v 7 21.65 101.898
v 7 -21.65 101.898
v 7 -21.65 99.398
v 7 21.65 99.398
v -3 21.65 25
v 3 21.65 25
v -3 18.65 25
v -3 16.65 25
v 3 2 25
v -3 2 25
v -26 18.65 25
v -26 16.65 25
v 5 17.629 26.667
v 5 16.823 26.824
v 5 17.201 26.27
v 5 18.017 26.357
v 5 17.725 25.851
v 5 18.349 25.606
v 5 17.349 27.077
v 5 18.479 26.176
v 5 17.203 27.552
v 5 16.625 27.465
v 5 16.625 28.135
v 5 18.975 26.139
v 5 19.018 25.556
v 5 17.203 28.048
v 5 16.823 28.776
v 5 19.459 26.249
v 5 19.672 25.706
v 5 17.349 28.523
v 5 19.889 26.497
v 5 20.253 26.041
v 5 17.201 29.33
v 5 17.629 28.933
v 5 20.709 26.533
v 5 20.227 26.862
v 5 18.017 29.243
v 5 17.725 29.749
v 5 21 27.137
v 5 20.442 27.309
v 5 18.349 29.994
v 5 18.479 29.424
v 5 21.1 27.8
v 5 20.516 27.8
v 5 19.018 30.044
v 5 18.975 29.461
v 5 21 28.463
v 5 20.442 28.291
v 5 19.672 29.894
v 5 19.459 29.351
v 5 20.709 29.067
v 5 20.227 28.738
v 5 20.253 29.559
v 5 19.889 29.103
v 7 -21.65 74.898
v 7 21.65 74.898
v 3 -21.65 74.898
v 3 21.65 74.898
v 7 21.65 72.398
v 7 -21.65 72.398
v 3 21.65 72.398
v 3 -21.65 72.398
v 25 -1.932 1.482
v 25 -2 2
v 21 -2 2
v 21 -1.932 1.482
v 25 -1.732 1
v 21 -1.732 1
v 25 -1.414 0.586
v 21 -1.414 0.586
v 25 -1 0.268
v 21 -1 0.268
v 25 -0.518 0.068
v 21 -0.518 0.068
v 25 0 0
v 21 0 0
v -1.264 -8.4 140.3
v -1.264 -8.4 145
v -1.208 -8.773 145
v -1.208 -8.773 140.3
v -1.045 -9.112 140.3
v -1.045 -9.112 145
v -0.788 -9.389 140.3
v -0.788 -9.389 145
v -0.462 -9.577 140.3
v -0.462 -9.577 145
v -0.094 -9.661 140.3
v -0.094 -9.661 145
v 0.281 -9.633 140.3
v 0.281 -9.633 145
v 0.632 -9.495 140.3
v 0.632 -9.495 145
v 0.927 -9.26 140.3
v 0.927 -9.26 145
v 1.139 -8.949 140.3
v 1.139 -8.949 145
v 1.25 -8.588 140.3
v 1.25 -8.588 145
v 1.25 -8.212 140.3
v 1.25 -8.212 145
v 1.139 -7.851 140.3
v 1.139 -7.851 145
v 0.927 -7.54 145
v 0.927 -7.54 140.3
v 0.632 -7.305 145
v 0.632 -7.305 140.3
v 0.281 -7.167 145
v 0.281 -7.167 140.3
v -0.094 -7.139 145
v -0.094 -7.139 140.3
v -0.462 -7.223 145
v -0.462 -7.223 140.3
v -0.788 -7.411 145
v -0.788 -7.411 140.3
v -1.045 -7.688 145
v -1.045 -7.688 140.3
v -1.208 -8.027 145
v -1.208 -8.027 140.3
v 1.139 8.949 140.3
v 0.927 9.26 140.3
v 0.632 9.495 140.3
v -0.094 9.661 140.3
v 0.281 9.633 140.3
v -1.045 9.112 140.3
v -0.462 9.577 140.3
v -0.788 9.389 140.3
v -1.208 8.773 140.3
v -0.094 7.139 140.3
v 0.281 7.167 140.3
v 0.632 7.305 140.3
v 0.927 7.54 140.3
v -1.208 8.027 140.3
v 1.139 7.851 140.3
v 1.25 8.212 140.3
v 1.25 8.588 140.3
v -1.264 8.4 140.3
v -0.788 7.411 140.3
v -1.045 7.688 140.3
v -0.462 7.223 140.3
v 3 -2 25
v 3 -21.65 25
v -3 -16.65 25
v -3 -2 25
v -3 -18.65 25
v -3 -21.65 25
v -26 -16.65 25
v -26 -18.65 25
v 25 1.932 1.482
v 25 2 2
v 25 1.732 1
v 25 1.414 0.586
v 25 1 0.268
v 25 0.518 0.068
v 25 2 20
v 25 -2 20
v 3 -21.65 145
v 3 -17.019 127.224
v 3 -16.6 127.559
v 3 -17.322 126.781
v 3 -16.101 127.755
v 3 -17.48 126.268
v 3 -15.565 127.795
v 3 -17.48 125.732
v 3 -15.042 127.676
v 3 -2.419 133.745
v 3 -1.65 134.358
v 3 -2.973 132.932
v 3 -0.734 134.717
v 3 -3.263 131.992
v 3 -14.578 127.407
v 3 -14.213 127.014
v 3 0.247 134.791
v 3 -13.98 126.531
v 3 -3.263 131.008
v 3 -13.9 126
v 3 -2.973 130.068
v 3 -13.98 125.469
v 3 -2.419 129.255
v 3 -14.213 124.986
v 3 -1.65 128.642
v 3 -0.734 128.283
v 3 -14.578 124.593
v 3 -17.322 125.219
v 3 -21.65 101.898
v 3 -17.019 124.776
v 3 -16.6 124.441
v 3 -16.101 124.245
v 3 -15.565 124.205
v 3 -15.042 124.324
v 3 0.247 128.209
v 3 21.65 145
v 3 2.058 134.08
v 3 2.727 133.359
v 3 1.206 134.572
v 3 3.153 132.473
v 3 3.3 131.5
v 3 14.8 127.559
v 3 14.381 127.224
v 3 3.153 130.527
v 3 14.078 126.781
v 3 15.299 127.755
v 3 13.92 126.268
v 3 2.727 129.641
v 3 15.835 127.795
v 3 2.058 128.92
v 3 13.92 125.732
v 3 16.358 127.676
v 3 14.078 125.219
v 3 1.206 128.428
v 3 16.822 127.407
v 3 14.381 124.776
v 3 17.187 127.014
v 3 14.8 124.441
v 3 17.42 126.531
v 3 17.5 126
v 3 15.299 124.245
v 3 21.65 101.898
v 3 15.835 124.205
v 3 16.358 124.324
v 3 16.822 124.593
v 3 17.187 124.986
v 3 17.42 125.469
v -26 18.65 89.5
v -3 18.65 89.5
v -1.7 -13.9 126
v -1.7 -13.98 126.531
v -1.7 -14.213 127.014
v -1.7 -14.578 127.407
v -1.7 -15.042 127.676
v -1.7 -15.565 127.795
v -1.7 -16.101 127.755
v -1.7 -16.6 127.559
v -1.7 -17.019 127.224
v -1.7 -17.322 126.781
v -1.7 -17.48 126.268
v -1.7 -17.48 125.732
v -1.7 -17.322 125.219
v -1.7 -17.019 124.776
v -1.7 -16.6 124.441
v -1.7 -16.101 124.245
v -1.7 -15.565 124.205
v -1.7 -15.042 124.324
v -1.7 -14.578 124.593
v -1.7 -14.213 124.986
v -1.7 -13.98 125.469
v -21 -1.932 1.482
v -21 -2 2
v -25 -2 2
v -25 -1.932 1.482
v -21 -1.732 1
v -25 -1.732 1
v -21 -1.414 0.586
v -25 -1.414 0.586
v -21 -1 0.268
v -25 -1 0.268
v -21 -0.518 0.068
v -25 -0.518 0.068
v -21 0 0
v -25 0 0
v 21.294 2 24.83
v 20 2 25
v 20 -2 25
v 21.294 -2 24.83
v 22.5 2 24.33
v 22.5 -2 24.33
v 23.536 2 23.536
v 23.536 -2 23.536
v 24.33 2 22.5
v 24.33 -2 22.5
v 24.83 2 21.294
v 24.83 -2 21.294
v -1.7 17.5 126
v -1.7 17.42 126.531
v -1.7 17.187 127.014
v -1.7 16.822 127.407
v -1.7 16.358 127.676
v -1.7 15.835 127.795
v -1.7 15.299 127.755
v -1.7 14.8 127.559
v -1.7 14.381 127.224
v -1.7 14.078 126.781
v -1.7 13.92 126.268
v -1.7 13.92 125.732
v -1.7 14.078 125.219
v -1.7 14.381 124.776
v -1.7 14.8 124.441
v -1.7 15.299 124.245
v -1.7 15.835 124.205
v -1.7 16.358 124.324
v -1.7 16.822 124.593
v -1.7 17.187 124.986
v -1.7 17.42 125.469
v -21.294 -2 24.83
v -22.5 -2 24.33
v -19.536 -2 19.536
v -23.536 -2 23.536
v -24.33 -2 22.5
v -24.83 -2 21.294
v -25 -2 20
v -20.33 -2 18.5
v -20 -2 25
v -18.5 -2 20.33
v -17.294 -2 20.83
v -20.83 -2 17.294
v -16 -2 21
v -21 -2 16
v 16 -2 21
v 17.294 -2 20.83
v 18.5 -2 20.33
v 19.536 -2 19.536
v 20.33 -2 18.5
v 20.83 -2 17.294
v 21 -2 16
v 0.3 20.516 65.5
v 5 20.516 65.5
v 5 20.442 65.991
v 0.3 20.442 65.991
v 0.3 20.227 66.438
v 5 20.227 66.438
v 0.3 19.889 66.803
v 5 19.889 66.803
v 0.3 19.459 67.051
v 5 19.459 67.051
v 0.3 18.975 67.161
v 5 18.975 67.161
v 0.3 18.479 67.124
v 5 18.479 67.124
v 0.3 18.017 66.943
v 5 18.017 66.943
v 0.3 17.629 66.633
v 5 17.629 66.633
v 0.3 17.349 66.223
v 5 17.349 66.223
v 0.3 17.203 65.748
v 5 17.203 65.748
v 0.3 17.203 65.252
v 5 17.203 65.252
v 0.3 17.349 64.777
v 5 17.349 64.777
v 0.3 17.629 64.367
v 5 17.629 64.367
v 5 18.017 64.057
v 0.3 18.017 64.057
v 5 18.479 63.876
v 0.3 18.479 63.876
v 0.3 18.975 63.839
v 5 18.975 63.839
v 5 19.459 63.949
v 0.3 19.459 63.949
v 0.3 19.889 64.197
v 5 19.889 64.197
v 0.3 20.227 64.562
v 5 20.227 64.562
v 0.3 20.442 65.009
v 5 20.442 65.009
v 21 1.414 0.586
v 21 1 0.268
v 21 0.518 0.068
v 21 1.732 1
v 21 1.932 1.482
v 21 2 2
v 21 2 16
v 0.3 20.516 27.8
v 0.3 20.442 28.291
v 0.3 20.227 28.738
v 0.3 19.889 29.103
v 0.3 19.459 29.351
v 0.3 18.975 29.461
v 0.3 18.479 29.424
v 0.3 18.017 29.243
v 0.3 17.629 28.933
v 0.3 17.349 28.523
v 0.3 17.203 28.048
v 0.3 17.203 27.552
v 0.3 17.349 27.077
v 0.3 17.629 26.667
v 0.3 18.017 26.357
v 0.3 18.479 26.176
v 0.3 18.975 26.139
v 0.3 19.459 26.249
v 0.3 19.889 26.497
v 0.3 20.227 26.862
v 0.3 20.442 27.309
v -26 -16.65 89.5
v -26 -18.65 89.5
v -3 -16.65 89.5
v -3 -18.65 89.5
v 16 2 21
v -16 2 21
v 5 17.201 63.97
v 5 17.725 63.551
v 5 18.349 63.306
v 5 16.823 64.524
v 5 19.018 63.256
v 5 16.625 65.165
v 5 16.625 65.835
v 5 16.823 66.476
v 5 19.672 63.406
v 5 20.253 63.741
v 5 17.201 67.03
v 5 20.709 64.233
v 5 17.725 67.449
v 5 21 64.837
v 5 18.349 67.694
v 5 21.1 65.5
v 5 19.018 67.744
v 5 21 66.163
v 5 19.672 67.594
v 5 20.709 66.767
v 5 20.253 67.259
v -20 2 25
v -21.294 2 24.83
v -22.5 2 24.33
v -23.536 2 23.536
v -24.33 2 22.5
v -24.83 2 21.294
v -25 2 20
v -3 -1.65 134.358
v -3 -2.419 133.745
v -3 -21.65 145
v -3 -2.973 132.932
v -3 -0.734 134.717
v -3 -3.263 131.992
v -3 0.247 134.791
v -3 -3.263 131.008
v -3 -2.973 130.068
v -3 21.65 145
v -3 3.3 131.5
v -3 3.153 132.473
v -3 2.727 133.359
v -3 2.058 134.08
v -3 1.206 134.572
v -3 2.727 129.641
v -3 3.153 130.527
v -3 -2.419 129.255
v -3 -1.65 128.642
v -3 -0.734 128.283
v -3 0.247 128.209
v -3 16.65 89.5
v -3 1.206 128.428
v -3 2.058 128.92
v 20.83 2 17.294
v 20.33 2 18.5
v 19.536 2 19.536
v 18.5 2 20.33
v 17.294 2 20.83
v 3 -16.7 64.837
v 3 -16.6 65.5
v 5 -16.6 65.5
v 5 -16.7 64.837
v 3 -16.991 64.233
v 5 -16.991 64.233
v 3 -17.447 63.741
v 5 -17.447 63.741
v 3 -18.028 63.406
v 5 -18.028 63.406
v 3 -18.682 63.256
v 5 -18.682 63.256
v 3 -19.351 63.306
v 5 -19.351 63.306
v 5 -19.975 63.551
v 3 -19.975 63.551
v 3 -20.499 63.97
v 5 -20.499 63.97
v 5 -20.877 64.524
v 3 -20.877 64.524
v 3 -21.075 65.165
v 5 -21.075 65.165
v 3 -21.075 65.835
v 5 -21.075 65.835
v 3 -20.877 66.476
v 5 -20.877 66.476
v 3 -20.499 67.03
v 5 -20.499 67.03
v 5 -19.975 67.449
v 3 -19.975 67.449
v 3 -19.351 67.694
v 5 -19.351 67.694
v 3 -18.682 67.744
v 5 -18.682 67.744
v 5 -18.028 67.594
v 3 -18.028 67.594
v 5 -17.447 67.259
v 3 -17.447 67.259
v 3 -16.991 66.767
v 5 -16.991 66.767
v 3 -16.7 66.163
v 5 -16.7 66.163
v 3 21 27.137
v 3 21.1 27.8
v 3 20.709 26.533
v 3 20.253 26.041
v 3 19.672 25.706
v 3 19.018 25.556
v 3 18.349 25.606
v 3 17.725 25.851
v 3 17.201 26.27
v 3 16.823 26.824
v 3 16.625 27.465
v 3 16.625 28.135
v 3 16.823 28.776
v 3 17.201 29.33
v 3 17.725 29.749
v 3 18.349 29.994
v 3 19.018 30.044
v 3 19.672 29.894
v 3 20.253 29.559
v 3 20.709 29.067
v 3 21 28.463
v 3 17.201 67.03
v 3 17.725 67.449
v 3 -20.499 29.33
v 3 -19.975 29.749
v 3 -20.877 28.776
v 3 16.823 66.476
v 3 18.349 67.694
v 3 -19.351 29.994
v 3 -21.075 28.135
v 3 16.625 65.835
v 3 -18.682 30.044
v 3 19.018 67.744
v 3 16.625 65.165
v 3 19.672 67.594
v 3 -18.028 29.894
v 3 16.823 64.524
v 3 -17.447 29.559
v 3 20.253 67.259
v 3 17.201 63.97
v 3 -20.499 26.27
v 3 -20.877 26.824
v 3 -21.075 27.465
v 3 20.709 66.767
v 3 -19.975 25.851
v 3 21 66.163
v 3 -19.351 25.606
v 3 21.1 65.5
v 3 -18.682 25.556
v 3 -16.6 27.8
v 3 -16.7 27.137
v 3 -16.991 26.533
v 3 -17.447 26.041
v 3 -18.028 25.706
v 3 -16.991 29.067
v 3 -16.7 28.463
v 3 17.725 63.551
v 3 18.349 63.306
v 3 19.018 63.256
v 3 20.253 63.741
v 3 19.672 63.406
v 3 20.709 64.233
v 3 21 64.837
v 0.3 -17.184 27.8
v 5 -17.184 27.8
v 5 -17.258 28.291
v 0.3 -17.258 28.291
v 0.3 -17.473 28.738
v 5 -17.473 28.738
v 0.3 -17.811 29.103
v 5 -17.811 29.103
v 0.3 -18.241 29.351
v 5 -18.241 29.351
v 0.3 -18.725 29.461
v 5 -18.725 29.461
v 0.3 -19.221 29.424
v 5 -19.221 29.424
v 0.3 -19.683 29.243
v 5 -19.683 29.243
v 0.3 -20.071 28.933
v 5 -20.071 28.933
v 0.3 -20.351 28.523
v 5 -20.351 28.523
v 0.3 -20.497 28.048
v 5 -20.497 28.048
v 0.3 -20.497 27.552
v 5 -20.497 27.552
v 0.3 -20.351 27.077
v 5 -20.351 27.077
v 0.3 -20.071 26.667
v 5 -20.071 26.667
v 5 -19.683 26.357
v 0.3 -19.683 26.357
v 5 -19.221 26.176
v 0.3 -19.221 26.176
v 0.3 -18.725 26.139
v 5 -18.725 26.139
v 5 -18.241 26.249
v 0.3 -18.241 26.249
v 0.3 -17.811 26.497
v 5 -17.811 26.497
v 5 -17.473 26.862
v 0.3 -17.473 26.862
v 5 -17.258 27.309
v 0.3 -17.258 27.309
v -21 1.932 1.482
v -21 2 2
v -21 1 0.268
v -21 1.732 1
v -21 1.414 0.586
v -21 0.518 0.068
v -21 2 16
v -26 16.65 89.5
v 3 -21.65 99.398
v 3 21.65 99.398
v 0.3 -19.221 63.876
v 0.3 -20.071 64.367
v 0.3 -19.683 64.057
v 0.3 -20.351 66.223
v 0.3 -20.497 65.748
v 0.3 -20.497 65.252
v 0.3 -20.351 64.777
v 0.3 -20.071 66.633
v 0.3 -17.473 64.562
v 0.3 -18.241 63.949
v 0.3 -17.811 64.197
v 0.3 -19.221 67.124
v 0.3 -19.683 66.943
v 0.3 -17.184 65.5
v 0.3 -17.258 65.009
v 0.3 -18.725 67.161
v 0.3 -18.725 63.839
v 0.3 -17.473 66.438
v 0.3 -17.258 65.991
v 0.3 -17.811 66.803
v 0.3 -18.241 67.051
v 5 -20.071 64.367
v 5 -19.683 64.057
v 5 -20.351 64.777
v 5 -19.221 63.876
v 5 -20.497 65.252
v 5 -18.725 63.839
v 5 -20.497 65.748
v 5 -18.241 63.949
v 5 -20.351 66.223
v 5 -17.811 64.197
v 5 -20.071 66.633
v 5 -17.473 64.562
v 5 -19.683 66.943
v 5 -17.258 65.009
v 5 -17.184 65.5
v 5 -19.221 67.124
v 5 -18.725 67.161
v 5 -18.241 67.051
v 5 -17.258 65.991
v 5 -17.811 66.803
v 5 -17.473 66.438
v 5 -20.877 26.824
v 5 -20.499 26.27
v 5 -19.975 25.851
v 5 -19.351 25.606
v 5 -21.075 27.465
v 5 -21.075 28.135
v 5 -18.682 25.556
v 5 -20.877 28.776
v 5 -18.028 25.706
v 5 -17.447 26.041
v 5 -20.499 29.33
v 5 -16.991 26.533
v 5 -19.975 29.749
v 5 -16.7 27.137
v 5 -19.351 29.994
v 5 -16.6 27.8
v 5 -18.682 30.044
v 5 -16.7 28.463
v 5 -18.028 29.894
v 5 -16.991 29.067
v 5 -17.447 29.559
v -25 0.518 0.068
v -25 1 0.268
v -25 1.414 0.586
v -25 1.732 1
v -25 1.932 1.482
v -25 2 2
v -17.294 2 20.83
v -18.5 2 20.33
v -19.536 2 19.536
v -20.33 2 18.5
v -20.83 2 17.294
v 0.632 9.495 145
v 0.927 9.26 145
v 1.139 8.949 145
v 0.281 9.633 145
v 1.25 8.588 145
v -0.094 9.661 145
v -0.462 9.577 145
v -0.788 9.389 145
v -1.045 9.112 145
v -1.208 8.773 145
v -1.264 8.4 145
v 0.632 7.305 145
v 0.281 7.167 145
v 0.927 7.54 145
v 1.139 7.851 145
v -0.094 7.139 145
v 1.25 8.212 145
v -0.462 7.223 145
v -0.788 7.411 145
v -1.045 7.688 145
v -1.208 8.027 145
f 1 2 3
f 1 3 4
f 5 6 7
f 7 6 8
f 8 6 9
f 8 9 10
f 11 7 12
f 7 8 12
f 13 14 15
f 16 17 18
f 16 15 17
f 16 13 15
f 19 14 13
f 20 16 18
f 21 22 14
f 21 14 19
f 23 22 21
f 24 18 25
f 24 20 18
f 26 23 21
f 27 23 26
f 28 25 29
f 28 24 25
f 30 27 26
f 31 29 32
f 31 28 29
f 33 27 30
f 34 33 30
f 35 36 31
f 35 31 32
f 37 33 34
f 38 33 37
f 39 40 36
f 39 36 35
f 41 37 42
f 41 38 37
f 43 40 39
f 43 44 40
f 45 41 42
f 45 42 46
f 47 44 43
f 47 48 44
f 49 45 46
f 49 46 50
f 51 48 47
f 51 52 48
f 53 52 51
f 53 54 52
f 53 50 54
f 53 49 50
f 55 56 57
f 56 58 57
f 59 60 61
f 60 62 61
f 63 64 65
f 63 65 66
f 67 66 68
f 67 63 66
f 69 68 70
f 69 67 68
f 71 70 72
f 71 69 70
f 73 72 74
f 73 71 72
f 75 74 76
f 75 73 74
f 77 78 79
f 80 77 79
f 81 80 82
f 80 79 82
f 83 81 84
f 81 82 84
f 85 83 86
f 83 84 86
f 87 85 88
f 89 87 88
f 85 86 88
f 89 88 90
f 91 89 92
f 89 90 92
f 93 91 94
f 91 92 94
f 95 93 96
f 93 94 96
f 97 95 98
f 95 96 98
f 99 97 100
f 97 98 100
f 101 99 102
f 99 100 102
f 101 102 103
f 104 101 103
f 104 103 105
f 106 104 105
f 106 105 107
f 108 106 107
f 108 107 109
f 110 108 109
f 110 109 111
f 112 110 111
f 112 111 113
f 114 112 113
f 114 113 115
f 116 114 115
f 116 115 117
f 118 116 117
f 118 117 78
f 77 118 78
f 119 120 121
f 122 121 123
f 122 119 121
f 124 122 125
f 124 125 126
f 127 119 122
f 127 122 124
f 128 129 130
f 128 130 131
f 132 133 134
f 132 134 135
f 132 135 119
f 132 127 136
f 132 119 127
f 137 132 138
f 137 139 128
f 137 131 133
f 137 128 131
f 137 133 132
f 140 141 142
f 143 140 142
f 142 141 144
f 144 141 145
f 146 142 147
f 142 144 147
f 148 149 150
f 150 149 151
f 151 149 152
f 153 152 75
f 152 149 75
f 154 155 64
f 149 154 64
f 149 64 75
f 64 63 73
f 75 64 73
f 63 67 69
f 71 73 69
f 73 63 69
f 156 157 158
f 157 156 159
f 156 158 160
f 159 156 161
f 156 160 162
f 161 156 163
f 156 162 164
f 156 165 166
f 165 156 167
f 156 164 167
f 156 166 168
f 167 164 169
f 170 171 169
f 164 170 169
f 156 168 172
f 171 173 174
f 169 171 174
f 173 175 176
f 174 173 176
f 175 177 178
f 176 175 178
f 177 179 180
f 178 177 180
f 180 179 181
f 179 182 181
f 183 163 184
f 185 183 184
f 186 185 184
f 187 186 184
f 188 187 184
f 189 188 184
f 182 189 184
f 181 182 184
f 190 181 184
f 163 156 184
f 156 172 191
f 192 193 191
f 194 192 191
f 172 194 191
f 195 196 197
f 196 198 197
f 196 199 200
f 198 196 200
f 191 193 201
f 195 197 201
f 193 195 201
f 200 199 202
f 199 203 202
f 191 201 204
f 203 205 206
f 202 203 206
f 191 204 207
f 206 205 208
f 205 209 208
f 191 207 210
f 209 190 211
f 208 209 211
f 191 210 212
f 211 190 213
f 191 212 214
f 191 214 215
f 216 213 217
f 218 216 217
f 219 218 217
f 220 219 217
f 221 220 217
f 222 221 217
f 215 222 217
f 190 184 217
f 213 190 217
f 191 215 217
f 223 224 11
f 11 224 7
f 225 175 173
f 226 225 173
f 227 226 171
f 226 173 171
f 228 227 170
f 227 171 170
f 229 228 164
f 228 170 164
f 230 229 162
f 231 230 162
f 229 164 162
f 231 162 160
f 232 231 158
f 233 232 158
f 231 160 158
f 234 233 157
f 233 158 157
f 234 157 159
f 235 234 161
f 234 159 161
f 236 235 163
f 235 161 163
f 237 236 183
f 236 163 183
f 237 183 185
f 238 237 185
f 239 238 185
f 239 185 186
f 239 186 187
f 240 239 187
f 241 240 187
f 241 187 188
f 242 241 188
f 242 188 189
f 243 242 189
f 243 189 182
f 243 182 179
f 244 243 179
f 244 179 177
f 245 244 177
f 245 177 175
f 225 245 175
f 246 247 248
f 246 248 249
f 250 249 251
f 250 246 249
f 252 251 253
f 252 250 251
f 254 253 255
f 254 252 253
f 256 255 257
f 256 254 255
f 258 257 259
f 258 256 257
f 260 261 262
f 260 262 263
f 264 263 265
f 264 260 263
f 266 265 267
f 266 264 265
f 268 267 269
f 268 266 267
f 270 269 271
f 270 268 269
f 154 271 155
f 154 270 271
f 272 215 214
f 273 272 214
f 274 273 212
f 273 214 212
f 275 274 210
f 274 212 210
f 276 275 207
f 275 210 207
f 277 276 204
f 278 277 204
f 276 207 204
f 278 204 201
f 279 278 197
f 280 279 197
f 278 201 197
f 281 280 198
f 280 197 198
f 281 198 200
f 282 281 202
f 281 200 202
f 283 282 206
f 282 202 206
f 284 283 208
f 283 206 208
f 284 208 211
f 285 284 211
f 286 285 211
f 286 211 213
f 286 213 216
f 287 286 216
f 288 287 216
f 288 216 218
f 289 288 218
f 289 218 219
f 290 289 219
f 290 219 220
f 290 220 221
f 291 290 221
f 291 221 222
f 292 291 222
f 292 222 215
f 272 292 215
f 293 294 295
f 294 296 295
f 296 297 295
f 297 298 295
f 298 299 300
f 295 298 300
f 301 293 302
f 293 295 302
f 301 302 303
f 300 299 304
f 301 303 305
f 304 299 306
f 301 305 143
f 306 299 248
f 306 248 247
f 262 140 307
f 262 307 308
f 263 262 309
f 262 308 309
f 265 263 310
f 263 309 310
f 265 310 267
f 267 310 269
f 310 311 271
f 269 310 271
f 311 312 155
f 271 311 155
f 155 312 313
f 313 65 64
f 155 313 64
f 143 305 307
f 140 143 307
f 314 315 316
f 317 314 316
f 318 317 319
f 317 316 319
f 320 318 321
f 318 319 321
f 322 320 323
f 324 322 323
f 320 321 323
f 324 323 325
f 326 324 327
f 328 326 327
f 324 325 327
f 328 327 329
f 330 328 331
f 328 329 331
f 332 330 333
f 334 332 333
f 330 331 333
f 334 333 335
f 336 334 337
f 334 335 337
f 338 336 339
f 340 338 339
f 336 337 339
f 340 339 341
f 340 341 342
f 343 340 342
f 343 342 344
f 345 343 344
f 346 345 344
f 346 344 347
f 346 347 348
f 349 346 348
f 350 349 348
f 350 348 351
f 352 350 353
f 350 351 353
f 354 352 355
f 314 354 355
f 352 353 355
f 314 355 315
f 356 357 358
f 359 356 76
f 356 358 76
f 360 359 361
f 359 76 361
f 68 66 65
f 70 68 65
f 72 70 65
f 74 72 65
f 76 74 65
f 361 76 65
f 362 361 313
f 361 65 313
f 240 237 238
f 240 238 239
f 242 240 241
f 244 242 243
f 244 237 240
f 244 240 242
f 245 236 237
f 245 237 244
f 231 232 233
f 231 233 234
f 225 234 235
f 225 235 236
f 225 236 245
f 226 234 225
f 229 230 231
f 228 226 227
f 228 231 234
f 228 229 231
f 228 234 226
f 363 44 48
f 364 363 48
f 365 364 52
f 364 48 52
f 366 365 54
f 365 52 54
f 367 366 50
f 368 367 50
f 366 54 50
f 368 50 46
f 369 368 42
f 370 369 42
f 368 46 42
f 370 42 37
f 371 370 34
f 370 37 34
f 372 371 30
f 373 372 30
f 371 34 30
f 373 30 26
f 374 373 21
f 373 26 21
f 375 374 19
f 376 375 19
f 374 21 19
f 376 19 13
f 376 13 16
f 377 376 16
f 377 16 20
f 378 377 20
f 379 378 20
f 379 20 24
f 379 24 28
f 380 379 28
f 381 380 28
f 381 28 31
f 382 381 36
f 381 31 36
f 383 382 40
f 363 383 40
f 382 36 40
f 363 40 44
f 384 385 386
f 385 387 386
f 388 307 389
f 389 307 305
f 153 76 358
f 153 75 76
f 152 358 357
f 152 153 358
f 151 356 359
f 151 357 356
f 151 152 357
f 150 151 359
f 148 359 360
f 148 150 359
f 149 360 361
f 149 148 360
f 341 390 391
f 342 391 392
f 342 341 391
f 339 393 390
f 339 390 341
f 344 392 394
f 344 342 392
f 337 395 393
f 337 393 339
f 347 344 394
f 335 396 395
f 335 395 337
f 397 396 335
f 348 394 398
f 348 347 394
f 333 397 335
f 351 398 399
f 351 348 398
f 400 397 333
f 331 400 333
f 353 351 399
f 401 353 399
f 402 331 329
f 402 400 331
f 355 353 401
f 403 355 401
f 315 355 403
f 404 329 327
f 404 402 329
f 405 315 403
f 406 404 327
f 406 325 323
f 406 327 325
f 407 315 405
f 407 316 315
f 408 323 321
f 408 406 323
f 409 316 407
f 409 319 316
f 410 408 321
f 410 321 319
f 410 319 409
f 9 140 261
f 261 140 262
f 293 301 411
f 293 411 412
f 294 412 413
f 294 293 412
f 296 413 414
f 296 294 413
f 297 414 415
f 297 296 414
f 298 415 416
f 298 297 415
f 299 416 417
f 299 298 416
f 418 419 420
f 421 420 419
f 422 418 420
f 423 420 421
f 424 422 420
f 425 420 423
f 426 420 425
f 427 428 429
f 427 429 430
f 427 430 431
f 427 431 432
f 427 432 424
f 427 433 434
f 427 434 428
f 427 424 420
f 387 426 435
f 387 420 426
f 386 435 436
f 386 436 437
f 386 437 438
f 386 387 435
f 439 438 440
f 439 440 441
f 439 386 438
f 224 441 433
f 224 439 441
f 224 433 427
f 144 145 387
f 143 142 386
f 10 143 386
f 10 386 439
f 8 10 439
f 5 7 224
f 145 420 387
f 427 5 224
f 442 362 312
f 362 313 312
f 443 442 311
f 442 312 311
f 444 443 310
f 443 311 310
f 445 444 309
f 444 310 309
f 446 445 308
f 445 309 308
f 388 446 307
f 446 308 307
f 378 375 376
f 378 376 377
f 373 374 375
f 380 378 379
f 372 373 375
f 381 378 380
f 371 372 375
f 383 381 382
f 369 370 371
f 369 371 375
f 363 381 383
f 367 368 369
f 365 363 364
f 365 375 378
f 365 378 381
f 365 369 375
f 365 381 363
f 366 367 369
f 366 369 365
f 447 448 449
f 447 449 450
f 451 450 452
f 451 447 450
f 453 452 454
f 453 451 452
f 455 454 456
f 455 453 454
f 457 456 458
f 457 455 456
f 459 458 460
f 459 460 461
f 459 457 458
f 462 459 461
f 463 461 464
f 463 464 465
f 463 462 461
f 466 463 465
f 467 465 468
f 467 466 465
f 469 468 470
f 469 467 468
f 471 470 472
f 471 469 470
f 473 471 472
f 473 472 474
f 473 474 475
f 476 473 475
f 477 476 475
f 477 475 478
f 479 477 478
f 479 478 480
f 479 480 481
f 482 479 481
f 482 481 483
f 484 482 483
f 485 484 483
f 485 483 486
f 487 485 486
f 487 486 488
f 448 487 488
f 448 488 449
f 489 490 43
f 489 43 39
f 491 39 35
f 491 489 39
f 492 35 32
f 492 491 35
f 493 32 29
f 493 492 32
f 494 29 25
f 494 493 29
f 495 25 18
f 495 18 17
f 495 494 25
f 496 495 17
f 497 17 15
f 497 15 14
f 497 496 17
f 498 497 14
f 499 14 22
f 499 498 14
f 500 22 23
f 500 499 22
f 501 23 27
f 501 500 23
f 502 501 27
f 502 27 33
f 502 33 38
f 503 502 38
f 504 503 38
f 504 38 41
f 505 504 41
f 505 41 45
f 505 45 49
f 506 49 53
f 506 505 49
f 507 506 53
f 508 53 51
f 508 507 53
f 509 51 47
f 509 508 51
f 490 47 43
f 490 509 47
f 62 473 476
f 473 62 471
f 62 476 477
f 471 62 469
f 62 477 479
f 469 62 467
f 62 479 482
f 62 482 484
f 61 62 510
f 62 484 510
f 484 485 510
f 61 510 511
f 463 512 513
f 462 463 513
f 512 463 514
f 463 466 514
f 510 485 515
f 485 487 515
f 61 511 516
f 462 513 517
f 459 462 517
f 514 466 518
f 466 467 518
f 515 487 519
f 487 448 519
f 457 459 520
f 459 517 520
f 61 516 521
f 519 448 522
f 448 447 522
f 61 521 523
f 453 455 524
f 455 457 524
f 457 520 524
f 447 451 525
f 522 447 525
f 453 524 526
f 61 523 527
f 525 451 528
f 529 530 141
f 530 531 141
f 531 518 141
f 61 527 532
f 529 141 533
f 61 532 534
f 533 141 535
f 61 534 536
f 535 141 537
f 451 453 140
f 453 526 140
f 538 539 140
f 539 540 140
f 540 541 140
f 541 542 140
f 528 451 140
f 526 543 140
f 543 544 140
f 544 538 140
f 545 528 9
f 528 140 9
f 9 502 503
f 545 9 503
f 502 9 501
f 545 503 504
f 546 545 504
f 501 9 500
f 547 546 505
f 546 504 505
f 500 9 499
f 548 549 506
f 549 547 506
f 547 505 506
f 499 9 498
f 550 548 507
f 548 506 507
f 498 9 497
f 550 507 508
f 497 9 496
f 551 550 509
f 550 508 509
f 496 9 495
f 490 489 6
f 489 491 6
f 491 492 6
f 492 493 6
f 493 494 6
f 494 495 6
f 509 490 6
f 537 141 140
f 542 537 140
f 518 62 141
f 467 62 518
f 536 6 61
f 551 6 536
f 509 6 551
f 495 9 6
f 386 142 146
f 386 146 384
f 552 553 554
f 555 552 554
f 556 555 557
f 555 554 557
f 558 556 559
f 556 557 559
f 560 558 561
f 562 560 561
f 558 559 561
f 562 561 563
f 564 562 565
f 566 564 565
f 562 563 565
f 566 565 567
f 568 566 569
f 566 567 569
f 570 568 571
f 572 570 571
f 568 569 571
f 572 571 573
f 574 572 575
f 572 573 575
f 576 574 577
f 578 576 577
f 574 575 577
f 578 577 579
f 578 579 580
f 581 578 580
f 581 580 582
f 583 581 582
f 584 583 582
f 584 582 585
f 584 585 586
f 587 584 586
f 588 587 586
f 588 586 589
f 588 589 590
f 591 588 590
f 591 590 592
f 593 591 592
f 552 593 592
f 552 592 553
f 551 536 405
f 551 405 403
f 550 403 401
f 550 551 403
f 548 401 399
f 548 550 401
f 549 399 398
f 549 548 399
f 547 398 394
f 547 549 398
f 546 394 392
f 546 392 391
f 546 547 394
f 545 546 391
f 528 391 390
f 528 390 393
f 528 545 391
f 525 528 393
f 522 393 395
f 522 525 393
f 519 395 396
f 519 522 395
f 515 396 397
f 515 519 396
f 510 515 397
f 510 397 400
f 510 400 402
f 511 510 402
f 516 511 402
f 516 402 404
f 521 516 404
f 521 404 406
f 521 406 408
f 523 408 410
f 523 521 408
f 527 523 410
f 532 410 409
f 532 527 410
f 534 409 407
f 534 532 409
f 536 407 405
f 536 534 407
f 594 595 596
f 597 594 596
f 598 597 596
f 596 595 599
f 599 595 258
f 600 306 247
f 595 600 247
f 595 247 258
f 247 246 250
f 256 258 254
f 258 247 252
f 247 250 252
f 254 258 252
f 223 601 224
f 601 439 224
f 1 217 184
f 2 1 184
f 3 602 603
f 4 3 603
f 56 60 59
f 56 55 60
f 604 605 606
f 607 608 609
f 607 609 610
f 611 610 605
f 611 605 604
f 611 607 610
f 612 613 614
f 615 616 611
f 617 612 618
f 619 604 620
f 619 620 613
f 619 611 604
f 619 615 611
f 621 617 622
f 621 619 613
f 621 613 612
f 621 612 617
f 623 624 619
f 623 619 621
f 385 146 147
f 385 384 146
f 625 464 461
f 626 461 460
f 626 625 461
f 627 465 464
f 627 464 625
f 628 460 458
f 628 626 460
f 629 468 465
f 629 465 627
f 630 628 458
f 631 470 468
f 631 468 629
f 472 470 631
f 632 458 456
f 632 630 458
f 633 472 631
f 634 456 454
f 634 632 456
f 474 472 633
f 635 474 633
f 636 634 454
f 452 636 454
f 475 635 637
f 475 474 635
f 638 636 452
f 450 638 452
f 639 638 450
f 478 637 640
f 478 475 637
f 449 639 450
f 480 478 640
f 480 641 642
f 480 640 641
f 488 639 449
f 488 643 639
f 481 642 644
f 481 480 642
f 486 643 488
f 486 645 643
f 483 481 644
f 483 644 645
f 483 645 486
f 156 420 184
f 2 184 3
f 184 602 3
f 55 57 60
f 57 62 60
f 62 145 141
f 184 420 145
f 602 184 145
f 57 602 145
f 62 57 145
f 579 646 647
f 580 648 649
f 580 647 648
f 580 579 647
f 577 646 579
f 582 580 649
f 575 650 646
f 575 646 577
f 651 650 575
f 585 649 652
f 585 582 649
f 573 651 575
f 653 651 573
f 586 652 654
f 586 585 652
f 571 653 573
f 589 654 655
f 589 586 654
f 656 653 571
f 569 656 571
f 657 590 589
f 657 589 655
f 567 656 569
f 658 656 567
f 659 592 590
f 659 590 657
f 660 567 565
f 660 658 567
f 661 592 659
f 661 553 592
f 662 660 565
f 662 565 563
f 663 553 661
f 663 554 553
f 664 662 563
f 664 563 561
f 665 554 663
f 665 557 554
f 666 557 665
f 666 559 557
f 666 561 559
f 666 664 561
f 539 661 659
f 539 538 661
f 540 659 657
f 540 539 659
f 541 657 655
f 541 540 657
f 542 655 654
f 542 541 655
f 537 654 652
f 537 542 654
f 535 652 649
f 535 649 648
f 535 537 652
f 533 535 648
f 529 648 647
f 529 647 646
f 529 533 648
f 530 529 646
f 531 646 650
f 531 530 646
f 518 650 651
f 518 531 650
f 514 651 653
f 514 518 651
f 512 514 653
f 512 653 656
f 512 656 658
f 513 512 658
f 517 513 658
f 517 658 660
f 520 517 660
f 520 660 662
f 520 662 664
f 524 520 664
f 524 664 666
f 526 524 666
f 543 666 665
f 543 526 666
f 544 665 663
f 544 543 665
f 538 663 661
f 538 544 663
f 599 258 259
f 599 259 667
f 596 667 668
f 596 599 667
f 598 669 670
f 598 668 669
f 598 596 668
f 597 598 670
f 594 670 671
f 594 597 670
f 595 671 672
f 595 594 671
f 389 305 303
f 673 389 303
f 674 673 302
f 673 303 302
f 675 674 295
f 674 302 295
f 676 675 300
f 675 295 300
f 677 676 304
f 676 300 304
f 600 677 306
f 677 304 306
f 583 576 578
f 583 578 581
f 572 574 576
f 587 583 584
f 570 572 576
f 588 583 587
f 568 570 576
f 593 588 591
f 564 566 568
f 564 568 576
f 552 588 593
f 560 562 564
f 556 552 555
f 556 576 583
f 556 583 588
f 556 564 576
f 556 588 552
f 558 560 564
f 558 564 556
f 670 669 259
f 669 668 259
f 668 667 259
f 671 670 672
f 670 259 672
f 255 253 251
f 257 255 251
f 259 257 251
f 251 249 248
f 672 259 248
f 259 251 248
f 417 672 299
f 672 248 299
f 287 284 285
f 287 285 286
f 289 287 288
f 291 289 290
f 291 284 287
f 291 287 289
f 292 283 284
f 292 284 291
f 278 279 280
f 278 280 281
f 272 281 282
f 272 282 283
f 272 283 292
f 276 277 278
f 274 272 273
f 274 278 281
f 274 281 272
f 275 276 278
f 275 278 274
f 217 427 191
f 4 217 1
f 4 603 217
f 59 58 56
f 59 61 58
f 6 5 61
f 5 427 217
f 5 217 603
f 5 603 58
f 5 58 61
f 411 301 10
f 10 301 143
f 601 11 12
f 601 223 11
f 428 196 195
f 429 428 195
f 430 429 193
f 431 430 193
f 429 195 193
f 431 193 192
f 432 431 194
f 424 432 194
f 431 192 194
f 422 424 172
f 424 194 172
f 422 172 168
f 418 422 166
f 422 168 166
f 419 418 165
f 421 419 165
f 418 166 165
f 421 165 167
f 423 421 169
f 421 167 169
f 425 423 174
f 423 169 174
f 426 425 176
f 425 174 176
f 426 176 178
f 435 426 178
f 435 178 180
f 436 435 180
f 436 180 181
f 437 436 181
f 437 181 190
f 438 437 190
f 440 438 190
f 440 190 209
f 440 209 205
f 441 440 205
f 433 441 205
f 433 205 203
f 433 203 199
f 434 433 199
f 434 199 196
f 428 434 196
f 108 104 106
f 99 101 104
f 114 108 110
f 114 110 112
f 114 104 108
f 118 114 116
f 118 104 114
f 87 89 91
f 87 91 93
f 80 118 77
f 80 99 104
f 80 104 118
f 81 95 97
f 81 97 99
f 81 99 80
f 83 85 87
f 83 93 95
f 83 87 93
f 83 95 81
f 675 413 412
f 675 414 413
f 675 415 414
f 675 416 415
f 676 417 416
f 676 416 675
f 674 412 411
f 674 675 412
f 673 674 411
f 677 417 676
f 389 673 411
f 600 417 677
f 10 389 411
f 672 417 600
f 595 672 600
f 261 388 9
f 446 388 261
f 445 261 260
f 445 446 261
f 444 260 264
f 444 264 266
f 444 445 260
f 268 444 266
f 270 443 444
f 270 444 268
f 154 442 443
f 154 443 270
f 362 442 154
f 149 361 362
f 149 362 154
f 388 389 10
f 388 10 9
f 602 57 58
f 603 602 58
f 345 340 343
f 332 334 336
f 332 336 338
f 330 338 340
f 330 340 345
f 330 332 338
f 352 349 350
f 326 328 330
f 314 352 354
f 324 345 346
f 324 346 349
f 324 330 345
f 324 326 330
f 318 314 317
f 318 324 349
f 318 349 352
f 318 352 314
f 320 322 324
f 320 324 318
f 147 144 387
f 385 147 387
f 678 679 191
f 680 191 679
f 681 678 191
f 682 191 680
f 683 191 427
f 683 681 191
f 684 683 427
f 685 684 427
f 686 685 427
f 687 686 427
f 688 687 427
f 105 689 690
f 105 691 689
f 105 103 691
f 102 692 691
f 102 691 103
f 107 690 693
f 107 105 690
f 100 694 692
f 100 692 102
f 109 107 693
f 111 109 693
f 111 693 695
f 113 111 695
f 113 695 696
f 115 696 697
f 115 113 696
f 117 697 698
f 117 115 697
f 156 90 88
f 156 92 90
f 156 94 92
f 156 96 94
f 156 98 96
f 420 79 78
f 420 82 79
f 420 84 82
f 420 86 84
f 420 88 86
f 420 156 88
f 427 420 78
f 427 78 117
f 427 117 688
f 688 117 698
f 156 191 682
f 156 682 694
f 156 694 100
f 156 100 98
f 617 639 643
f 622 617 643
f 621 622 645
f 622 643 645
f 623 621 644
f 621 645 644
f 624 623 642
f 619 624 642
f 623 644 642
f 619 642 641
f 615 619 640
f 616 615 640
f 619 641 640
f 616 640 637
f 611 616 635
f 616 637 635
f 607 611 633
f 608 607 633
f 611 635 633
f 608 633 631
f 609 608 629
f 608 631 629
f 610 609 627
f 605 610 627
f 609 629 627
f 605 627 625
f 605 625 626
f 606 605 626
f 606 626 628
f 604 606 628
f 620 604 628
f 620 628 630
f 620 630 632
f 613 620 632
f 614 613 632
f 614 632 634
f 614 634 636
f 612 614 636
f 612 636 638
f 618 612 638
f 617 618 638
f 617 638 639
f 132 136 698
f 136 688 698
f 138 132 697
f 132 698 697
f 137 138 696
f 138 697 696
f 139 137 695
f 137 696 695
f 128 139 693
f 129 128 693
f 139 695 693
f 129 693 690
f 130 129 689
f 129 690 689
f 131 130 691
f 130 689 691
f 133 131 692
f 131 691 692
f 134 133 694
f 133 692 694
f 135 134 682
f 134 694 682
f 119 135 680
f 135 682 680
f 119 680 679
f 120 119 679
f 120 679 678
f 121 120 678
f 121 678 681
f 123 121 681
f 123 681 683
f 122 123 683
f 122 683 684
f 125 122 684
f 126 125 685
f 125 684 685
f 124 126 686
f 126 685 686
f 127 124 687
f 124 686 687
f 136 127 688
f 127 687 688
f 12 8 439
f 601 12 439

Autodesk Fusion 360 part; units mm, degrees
sketch "스케치1" plane through (0, 0, 0) normal (0, 1, 0) x (1, 0, 0)
  line L0 (-25, 0) -> (-25, -25)
  line L1 (-25, -25) -> (25, -25)
  line L2 (25, -25) -> (25, 0)
  line L3 (25, 0) -> (21, 0)
  line L4 (21, 0) -> (21, -21)
  line L5 (21, -21) -> (-21, -21)
  line L6 (-21, -21) -> (-21, 0)
  line L7 (-21, 0) -> (-25, 0)
extrude "돌출1" add sketch "스케치1" along normal mid plane 4
sketch "스케치2" plane through (0, 0, 25) normal (0, 0, 1) x (-1, 0, 0)
  line L0 (25, 2) -> (-25, 2)
  line L1 (3, -21.65) -> (-3, -21.65)
  line L2 (3, -21.65) -> (3, 0)
  line L3 (-3, -21.65) -> (-3, 0)
  line L4 (-20, 0) -> (-2.5, 0)
  line L5 (3, 21.65) -> (-3, 21.65)
  line L6 (3, 21.65) -> (3, 0)
  line L7 (-3, 21.65) -> (-3, 0)
  line L8 (25, -2) -> (-25, -2)
  dimension "d29" = 21.65
  dimension "d30" = 3
  dimension "d31" = 3
extrude "돌출2" add sketch "스케치2" along normal blind 120
sketch "스케치14" plane through (0, 0, 145) normal (0, 0, 1) x (-1, 0, 0)
  circle A0 centre (0, -8.4) radius 1.8
  line L0 (-1.75, 0) -> (-22.5, 0)
  circle A1 centre (0, 8.4) radius 1.8
  dimension "d34" = 3.6
  dimension "d35" = 8.4
extrude "돌출10" cut sketch "스케치14" against normal blind 4.7
thread "스레드1" "ISO Metric profile 3.0 M3x0.5 6H" major diameter 3.086 minor diameter 2.529 pitch 0.5 angle 60 resizes the face on face at (-1.7978, 8.4897, 141.8667)
thread "스레드2" "ISO Metric profile 3.0 M3x0.5 6H" major diameter 3.086 minor diameter 2.529 pitch 0.5 angle 60 resizes the face on face at (-1.7978, -8.3103, 141.8667)
sketch "스케치15" plane through (3, 0, 0) normal (1, 0, 0) x (0, 1, 0)
  line L0 (0, 1.75) -> (0, 22.5)
  line L1 (-21.65, 145) -> (21.65, 145)
  circle A0 centre (-18.85, 27.8) radius 2.25
  line L2 (2, 25) -> (21.65, 25)
  line L3 (-21.65, 25) -> (-21.65, 145)
  circle A1 centre (-18.85, 65.5) radius 2.25
  circle A2 centre (18.85, 65.5) radius 2.25
  circle A3 centre (18.85, 27.8) radius 2.25
  dimension "d43" = 4.5
  dimension "d44" = 2.8
  dimension "d45" = 2.8
  dimension "d46" = 4.5
  dimension "d47" = 37.7
extrude "돌출13" add sketch "스케치15" along normal blind 2
sketch "스케치17" plane through (5, 0, 0) normal (1, 0, 0) x (0, 1, 0)
  circle A0 centre (-18.85, 65.5) radius 1.8
  circle A1 centre (-18.85, 27.8) radius 1.8
  line L0 (0, 1.75) -> (0, 22.5)
  circle A2 centre (18.85, 27.8) radius 1.8
  circle A3 centre (18.85, 65.5) radius 1.8
  point P0 (-18.85, 65.5)
  point P1 (-18.85, 27.8)
  dimension "d56" = 3.6
  dimension "d57" = 3.6
extrude "돌출15" cut sketch "스케치17" against normal blind 4.7
thread "스레드7" "ISO Metric profile 4.0 M4x0.7 6H" major diameter 4.1095 minor diameter 3.332 pitch 0.7 angle 60 resizes the face on face at (1.8667, -17.3141, 66.4386)
thread "스레드8" "ISO Metric profile 4.0 M4x0.7 6H" major diameter 4.1095 minor diameter 3.332 pitch 0.7 angle 60 resizes the face on face at (1.8667, 20.4308, 66.3609)
thread "스레드9" "ISO Metric profile 4.0 M4x0.7 6H" major diameter 4.1095 minor diameter 3.332 pitch 0.7 angle 60 resizes the face on face at (3.4333, -17.0589, 27.6208)
thread "스레드10" "ISO Metric profile 4.0 M4x0.7 6H" major diameter 4.1095 minor diameter 3.332 pitch 0.7 angle 60 resizes the face on face at (1.8667, 20.6478, 27.7103)
sketch "스케치18" plane through (3, 0, 0) normal (1, 0, 0) x (0, 1, 0)
  line L0 (-21.65, 72.3985) -> (21.65, 72.3985)
  line L1 (21.65, 72.3985) -> (21.65, 74.8985)
  line L2 (21.65, 74.8985) -> (-21.65, 74.8985)
  line L3 (-21.65, 74.8985) -> (-21.65, 72.3985)
  line L4 (-21.65, 25) -> (-21.65, 145)
  line L5 (21.65, 25) -> (21.65, 145)
  line L6 (-21.65, 99.3985) -> (21.65, 99.3985)
  line L7 (21.65, 99.3985) -> (21.65, 101.8985)
  line L8 (21.65, 101.8985) -> (-21.65, 101.8985)
  line L9 (-21.65, 101.8985) -> (-21.65, 99.3985)
  dimension "d60" = 2.5
  dimension "d61" = 2.5
  dimension "d62" = 24.5
extrude "돌출16" add sketch "스케치18" along normal blind 4 contours L0 L1 L2 L3 L4 L5 | L4 L5 L6 L7 L8 L9
sketch "스케치19" plane through (3, 0, 0) normal (1, 0, 0) x (0, 1, 0)
  circle A0 centre (0, 126) radius 12
  circle A1 centre (15.7, 126) radius 1.8
  line L0 (0, 2.5) -> (0, 20)
  circle A2 centre (-15.7, 126) radius 1.8
  circle A3 centre (0, 131.5) radius 3.3
  circle A4 centre (0, 131.5) radius 1.8
  dimension "d65" = 24
  dimension "d66" = 3.6
  dimension "d67" = 15.7
  dimension "d68" = 6.6
  dimension "d69" = 5.5
  dimension "d70" = 3.6
extrude "돌출17" cut sketch "스케치19" against normal blind 4.7 contours A1 | A2
extrude "돌출18" cut sketch "스케치19" against normal through all contours A3 | A4
sketch "스케치20" plane through (-3, 0, 0) normal (-1, 0, 0) x (0, -1, 0)
  line L0 (-2, 25) -> (-21.65, 25)
  line L1 (-16.65, 25) -> (-16.65, 89.5)
  line L2 (16.65, 25) -> (16.65, 89.5)
  line L3 (-16.65, 89.5) -> (-18.65, 89.5)
  line L4 (-18.65, 89.5) -> (-18.65, 25)
  line L5 (-18.65, 25) -> (-16.65, 25)
  line L6 (16.65, 25) -> (18.65, 25)
  line L7 (18.65, 25) -> (18.65, 89.5)
  line L8 (18.65, 89.5) -> (16.65, 89.5)
  point P0 (21.65, 25)
  dimension "d74" = 33.3
  dimension "d75" = 5
  dimension "d76" = 5
  dimension "d77" = 2
  dimension "d78" = 2
  dimension "d79" = 64.5
extrude "돌출19" add sketch "스케치20" along normal blind 23
fillet "모깎기1" radius 5 4 edges at (-21, 0, 21) (-25, 0, 25) (21, 0, 21) (25, 0, 25)
fillet "모깎기2" radius 2 4 edges at (-23, -2, 0) (-23, 2, 0) (23, -2, 0) (23, 2, 0)
equation "d35 = 10 mm - 1.6 mm"
equation "d67 = 18.5 mm - 2.8 mm"
equation "d69 = 8.5 mm - 3 mm"
